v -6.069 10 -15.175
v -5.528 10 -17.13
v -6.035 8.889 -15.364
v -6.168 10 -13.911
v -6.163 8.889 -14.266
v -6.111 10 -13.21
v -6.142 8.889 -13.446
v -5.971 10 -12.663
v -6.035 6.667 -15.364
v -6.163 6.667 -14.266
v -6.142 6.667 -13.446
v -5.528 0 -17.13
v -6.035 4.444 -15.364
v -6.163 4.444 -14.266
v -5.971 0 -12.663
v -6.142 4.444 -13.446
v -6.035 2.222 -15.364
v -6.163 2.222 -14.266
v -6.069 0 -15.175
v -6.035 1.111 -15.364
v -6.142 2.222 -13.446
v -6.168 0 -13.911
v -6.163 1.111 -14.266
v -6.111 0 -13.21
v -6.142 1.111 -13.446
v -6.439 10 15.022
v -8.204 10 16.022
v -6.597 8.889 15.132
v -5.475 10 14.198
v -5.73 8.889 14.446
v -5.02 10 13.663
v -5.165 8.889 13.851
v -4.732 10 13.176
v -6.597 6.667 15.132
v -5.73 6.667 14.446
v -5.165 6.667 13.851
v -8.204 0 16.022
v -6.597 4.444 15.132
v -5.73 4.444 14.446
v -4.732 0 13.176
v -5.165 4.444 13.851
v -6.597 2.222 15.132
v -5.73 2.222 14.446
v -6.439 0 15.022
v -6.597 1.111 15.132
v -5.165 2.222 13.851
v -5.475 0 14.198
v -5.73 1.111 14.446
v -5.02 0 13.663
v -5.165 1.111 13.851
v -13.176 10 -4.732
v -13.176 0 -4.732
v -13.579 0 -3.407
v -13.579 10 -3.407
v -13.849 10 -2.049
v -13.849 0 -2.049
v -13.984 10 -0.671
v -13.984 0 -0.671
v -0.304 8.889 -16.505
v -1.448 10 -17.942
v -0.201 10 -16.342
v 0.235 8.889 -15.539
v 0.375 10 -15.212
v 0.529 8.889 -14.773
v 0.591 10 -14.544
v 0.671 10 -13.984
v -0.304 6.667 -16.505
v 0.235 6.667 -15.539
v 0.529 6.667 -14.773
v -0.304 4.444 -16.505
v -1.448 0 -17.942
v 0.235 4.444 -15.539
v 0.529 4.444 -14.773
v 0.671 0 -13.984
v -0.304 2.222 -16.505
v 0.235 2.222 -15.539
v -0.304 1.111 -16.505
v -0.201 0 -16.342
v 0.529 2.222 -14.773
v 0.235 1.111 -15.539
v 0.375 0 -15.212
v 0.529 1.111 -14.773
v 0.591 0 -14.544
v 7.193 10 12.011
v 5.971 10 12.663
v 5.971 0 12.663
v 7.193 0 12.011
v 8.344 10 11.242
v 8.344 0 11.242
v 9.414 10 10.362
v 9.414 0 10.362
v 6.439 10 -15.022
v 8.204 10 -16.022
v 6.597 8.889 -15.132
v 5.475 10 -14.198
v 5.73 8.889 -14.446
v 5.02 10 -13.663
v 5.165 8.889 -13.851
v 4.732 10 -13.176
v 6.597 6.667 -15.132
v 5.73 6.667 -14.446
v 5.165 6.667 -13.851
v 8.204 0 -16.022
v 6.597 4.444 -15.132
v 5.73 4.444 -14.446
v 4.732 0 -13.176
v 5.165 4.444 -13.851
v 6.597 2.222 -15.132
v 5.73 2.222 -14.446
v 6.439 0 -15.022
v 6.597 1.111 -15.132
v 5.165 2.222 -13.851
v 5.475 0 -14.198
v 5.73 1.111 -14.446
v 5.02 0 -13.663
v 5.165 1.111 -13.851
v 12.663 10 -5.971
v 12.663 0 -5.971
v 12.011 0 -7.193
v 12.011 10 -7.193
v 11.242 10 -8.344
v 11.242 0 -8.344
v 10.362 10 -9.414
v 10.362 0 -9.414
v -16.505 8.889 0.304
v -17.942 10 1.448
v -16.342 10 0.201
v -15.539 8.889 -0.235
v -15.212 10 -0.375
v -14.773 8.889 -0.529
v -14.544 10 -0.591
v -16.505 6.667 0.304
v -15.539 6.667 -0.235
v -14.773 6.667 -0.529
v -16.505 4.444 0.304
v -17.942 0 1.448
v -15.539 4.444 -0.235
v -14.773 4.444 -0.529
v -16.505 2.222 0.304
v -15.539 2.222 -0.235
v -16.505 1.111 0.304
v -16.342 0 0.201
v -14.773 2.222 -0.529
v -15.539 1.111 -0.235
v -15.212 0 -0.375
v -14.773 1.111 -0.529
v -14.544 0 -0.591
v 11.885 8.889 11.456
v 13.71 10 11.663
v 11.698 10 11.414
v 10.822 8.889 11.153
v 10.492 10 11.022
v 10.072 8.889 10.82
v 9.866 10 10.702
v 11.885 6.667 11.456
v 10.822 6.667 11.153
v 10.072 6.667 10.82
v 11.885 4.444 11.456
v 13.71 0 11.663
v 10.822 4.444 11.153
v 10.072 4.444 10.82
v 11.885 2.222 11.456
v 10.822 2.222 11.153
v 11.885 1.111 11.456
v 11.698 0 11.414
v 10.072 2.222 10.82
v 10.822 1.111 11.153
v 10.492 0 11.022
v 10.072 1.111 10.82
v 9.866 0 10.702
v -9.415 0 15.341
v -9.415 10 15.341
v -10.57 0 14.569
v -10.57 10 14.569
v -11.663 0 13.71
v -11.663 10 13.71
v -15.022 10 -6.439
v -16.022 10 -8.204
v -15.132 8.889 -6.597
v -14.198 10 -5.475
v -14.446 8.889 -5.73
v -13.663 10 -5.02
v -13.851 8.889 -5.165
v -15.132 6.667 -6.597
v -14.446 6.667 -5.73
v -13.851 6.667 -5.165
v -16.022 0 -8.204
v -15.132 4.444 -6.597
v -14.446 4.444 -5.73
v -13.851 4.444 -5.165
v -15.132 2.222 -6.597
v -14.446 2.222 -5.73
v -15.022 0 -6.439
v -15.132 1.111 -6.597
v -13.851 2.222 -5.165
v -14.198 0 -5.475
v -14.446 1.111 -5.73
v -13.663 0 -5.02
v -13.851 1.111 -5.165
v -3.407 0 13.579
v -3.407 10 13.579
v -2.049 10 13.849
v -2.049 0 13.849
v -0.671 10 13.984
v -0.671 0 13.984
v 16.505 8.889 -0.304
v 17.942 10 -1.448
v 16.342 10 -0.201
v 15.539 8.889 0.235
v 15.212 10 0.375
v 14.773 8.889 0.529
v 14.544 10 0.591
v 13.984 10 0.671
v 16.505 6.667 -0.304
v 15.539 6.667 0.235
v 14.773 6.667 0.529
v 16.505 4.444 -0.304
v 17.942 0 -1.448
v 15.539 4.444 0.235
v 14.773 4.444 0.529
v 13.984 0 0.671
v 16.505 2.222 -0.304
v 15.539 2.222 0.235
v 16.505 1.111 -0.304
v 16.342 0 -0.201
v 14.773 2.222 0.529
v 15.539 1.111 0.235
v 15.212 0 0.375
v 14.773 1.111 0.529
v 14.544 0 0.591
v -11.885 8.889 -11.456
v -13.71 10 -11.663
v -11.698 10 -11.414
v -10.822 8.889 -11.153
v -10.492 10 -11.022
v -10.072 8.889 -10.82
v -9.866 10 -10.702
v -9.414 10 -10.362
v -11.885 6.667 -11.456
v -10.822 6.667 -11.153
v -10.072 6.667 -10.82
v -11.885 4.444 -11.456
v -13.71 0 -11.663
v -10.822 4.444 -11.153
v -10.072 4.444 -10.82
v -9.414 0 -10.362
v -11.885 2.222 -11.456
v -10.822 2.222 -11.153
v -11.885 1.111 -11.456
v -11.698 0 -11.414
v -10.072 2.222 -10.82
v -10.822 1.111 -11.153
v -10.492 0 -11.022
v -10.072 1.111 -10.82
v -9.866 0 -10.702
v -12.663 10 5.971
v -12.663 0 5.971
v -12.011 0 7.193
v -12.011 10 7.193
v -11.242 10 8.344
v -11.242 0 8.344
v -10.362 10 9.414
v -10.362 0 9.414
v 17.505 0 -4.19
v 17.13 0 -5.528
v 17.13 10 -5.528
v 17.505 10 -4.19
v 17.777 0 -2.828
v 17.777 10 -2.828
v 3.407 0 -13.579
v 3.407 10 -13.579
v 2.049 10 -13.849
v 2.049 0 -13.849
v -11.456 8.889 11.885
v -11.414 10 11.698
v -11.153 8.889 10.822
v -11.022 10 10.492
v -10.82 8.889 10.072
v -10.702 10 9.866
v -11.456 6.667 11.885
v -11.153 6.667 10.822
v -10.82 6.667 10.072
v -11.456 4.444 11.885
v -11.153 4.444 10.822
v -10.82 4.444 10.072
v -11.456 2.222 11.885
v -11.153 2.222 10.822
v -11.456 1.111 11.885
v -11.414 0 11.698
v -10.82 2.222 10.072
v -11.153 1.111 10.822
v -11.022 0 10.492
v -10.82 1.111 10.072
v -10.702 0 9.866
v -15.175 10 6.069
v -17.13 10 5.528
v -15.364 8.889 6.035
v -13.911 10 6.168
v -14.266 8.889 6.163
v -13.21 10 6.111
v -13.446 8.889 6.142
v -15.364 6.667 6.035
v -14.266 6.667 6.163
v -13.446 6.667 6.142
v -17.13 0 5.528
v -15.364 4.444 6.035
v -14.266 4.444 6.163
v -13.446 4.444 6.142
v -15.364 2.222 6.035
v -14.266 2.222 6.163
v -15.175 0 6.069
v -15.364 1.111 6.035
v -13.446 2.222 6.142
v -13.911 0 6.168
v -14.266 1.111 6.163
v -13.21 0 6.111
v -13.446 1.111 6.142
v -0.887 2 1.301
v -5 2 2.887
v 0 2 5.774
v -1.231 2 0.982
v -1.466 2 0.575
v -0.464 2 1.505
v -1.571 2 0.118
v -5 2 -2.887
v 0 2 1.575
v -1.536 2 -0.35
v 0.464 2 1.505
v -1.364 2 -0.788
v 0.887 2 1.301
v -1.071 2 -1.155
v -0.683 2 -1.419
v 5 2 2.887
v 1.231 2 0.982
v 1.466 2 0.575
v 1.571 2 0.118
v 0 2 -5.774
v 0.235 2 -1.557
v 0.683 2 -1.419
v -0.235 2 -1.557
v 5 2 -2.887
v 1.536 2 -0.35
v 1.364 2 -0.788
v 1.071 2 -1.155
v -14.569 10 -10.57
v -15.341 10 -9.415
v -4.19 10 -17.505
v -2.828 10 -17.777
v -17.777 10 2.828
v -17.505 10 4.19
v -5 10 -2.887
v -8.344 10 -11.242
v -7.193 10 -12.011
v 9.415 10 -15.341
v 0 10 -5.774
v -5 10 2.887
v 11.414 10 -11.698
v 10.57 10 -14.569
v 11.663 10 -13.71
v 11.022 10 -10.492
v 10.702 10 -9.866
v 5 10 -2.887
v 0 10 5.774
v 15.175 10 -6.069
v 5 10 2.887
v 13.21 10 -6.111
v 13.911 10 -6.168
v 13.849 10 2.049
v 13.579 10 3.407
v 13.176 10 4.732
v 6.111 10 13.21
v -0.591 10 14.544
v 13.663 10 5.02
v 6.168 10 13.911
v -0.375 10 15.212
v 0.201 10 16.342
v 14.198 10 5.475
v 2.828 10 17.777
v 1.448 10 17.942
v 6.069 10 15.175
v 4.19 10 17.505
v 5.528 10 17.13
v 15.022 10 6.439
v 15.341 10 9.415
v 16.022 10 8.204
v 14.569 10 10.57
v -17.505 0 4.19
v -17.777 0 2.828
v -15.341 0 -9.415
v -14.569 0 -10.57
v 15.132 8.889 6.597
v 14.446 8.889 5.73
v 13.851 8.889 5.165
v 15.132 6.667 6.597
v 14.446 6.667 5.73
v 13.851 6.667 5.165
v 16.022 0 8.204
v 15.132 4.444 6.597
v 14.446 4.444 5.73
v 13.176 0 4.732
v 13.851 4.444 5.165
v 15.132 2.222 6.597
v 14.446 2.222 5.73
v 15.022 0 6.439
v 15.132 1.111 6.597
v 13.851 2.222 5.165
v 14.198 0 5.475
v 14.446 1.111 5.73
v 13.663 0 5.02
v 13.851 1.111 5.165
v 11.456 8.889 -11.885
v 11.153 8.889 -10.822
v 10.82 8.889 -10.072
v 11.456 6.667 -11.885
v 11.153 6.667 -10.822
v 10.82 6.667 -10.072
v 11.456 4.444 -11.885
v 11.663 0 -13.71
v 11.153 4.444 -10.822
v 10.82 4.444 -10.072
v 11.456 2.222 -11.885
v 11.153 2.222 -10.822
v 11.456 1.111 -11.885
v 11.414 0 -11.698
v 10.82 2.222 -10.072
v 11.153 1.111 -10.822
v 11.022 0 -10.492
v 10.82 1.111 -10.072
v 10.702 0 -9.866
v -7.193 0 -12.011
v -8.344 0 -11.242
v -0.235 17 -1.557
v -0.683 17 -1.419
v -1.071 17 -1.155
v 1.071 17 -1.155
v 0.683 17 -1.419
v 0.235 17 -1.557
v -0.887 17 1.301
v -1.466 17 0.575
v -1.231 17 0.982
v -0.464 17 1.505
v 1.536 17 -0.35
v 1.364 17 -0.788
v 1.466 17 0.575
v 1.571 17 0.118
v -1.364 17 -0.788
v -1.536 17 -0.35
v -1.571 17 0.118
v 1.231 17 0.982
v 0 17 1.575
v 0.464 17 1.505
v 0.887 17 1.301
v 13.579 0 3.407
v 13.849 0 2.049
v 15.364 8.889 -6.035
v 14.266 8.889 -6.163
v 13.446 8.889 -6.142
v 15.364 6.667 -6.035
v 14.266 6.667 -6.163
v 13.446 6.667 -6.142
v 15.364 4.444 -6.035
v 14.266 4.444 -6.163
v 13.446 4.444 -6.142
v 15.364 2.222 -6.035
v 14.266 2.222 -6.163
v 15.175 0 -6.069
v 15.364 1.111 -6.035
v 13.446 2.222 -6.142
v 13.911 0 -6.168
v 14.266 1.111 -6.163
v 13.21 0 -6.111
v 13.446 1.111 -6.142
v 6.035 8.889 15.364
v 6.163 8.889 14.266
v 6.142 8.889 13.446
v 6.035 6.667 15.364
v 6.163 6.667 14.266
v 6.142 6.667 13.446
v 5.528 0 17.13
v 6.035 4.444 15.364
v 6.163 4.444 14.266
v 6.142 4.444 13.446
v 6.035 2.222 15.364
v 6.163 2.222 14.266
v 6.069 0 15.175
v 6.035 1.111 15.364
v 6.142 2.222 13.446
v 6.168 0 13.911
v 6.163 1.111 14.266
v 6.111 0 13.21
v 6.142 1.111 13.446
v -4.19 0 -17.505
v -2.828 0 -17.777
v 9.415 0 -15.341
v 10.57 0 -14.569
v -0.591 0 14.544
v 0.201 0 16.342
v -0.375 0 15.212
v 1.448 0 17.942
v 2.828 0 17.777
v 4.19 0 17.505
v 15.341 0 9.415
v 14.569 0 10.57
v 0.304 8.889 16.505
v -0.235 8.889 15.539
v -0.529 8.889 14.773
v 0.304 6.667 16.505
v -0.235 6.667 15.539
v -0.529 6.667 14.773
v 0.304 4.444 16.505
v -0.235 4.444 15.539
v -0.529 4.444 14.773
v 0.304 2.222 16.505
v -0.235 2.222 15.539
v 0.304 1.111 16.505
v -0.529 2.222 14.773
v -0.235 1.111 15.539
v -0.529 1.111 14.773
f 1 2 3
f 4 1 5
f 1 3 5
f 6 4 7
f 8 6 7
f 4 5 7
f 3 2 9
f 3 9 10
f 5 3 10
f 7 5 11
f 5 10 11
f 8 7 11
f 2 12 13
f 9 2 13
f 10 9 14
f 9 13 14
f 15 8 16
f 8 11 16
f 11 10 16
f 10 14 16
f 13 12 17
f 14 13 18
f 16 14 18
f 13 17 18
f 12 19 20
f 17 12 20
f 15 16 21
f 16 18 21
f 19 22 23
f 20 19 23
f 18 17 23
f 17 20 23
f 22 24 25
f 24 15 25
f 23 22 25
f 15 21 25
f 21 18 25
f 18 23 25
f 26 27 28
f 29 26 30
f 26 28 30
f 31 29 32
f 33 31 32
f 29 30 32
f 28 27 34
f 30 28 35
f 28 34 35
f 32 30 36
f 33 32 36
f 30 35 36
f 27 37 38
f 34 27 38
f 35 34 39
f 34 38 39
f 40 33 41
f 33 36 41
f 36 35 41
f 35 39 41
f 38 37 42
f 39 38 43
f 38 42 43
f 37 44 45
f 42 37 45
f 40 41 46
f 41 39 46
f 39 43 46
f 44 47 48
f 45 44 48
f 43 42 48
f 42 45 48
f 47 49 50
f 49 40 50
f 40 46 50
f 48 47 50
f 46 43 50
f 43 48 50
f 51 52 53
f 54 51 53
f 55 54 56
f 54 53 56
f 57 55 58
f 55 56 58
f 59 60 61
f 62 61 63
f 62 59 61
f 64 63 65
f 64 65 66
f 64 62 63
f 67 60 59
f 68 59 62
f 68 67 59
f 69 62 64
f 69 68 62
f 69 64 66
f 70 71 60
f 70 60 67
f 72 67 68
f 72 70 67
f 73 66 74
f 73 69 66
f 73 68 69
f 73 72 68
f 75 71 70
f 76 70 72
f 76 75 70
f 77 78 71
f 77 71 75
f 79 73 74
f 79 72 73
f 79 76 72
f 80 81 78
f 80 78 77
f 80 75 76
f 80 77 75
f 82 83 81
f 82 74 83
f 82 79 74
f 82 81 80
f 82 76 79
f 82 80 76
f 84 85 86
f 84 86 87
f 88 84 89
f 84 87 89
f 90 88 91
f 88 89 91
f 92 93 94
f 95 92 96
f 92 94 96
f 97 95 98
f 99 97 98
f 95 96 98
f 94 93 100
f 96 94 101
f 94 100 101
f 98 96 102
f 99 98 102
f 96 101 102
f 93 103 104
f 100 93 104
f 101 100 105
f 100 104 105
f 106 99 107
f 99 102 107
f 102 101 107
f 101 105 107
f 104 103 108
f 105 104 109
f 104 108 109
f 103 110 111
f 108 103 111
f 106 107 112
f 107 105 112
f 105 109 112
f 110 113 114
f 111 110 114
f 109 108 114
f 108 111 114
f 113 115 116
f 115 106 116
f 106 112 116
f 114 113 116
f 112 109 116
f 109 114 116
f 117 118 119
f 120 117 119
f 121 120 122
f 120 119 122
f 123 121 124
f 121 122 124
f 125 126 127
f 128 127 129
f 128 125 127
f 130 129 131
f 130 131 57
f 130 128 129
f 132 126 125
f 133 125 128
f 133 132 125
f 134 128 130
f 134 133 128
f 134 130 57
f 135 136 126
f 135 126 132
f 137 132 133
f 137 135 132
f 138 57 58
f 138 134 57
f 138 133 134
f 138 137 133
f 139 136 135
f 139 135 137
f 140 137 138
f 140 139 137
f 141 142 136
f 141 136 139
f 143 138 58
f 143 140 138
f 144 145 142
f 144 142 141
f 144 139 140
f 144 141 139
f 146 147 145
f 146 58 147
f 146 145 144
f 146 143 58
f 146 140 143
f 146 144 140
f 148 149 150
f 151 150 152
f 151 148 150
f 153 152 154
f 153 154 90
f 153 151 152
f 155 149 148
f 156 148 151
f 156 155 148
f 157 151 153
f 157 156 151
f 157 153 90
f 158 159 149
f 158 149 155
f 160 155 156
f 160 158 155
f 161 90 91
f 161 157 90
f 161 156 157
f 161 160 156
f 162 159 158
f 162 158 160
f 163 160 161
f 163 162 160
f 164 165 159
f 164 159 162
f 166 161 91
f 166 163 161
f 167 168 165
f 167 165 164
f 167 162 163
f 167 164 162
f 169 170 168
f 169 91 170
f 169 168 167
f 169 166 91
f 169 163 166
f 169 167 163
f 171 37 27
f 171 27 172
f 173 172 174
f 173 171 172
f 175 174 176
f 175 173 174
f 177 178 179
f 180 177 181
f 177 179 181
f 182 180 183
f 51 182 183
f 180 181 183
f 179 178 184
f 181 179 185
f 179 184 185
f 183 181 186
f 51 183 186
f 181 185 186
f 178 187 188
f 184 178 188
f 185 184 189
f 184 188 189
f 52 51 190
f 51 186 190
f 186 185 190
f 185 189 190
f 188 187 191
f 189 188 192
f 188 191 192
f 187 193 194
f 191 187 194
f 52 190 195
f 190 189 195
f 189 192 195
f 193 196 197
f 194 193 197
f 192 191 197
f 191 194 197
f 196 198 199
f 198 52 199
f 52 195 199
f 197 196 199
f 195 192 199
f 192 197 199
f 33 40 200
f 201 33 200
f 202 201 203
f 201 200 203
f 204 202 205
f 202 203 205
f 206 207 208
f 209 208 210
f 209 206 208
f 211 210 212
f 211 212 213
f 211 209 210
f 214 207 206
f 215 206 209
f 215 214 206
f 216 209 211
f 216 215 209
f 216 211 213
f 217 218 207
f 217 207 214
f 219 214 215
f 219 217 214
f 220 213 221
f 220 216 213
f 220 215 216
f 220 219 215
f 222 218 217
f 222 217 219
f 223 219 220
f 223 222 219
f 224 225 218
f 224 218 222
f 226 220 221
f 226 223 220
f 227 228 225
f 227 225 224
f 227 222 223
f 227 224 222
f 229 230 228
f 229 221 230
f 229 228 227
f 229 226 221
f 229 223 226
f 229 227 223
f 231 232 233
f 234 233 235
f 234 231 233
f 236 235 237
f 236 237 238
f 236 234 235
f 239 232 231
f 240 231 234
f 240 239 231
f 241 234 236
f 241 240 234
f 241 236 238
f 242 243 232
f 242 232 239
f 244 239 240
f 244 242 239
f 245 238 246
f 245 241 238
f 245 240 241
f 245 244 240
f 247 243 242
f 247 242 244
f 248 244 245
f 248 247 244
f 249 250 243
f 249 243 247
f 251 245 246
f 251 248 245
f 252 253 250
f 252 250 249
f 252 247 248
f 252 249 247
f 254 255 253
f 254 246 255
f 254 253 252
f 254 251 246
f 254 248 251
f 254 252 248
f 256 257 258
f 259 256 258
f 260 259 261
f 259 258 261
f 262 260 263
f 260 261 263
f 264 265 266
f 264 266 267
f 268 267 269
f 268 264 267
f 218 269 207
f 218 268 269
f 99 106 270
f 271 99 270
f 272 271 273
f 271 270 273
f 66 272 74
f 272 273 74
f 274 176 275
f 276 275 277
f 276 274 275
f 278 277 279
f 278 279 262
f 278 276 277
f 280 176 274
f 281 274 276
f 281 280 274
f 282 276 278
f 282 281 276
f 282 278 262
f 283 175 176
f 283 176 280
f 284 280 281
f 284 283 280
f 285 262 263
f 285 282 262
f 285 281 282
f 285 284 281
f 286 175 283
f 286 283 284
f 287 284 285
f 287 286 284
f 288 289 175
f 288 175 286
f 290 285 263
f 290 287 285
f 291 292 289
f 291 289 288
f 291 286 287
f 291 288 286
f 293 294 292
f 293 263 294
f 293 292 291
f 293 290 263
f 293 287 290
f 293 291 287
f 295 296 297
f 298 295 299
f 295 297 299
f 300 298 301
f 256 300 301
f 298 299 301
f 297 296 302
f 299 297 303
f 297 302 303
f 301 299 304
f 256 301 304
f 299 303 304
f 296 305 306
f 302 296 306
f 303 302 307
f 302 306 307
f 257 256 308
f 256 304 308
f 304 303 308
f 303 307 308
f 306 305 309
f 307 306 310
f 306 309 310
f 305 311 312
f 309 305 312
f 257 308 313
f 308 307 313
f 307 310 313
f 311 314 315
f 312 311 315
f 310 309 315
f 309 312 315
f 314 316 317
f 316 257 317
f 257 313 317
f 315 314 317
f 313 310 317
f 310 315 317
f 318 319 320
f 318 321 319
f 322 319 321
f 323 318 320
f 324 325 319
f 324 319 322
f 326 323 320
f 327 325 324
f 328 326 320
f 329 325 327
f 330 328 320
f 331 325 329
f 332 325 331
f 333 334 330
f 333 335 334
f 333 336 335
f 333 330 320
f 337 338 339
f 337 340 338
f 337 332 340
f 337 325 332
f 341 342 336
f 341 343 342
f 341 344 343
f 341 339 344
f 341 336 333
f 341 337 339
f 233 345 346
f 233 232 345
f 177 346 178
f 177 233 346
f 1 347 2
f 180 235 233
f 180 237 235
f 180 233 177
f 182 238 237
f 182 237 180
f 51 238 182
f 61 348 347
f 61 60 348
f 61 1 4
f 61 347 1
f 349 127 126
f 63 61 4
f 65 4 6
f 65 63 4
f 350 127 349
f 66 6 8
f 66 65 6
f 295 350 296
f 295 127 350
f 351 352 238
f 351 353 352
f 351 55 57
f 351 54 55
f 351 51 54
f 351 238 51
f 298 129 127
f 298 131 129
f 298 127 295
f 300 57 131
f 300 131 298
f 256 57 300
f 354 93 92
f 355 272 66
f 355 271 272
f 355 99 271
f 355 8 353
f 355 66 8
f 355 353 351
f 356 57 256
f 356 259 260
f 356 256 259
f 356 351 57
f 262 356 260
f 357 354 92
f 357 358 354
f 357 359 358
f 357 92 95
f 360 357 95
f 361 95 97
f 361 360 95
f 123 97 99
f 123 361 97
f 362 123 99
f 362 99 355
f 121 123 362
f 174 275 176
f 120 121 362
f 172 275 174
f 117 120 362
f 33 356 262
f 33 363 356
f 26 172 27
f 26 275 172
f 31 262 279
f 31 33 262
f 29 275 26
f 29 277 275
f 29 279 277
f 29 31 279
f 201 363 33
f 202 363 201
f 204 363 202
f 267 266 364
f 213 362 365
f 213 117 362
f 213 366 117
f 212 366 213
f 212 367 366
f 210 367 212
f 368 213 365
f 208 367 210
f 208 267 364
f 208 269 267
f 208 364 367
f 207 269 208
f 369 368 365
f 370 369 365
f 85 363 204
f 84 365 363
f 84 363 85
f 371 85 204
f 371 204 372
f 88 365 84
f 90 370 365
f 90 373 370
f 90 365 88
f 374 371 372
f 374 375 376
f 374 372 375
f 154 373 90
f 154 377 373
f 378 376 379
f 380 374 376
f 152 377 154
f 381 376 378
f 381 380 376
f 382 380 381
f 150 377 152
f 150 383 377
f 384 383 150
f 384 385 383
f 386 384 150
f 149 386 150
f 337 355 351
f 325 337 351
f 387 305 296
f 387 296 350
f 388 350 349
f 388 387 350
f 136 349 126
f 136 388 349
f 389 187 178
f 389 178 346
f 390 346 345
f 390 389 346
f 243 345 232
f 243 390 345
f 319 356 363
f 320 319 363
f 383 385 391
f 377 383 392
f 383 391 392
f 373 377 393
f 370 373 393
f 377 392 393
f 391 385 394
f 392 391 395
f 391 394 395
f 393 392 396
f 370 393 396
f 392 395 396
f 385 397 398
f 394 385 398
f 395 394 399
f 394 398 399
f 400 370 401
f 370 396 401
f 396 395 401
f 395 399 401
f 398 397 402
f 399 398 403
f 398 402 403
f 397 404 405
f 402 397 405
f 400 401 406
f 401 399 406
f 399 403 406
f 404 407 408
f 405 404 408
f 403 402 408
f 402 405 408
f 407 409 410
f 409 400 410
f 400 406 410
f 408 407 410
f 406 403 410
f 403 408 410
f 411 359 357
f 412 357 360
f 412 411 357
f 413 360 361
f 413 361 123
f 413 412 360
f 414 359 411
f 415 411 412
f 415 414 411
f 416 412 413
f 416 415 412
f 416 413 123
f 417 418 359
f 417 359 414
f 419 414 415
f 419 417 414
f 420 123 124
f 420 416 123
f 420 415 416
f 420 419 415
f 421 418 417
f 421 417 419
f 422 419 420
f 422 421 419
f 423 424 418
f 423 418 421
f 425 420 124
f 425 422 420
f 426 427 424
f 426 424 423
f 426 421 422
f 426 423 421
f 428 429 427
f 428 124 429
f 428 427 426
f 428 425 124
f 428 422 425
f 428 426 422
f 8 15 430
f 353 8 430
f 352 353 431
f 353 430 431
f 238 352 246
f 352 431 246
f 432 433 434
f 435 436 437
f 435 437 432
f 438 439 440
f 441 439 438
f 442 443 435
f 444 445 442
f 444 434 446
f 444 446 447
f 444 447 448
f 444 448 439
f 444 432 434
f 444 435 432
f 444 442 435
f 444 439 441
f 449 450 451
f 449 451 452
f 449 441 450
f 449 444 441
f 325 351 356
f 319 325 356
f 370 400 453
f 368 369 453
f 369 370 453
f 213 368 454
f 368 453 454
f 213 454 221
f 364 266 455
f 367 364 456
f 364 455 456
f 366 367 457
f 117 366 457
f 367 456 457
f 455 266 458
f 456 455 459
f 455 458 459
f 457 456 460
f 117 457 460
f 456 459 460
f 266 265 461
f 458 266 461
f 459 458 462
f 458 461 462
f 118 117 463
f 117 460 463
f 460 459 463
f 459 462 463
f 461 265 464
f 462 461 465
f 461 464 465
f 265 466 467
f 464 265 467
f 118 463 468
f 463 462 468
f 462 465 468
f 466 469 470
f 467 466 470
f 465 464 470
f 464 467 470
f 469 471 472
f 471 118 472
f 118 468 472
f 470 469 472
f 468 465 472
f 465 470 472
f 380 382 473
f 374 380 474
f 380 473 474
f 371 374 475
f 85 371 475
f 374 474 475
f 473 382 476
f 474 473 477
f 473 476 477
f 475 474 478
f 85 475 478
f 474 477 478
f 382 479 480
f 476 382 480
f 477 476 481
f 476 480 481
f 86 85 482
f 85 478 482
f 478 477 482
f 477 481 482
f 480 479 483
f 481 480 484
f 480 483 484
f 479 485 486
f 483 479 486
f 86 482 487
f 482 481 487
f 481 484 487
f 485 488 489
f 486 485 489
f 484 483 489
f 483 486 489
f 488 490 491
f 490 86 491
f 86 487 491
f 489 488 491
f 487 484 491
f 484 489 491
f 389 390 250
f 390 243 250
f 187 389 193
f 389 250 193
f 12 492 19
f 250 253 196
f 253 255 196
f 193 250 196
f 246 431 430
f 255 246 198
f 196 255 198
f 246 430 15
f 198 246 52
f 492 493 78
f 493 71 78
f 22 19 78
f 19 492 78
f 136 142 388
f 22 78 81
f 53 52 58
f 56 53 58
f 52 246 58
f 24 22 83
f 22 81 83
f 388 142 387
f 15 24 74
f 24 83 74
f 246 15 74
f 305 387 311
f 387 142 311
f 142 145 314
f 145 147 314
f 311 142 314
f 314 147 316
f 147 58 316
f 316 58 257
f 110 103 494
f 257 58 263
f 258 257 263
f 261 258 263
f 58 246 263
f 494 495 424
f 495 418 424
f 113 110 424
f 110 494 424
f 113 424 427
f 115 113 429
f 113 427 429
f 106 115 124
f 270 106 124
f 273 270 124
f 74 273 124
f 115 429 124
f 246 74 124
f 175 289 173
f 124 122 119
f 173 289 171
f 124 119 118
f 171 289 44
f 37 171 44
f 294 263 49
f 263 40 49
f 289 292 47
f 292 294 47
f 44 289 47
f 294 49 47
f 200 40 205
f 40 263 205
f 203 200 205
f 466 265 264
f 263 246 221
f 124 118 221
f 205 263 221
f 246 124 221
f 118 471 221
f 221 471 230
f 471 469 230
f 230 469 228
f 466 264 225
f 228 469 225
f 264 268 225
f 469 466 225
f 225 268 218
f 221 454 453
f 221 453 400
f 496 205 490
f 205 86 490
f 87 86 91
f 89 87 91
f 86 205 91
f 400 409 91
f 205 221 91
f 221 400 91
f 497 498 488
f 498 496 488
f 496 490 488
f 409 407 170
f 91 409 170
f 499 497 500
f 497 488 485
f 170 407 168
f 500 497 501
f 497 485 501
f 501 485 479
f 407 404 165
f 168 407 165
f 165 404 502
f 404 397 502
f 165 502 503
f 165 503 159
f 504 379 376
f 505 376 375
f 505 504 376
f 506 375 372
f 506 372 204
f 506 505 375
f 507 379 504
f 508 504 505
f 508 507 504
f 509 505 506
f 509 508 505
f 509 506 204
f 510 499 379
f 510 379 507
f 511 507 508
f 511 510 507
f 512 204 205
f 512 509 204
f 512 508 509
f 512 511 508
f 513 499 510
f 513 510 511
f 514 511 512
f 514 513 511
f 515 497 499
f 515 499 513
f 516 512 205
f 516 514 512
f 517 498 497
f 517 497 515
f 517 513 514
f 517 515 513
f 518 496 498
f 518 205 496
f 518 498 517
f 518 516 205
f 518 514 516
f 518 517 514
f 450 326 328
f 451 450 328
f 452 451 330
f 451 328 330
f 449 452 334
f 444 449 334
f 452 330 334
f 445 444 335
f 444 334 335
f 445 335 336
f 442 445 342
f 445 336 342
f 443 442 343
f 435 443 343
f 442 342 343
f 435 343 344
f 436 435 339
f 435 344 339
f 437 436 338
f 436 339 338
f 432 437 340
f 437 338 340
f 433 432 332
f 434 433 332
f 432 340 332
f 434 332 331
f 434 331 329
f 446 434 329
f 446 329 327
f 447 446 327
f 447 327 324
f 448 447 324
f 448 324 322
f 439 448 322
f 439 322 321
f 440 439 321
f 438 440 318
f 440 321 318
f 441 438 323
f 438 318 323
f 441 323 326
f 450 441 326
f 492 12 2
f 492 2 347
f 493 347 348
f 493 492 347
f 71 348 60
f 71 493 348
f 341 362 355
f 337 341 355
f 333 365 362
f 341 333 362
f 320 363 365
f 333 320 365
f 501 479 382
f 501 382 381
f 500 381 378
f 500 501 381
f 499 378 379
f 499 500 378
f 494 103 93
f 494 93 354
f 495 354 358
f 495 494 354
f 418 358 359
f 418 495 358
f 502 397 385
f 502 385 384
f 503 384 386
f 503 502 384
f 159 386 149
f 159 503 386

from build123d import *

# Parameters (mm, degrees)
SKETCH_1_R               = 14
EXTRUDE_1_DEPTH          = 10
EXTRUDE_2_DEPTH          = 10
PATTERN_CIRCULAR_1_COUNT = 8
CUT_EXTRUDE_2_DEPTH      = 8
SKETCH_8_R               = 1.575
EXTRUDE_5_DEPTH          = 15


with BuildPart() as part:
    # ｽｹｯﾁ1 → ﾎﾞｽ - 押し出し1 (new body)
    with BuildSketch(Plane(origin=(0, 0, 0), x_dir=(1, 0, 0), z_dir=(0, 1, 0))):
        with Locations(Location((0, 0, 0), (0, 0, 270))):
            Circle(SKETCH_1_R)
    extrude(amount=EXTRUDE_1_DEPTH)

    # ｽｹｯﾁ3 → ﾎﾞｽ - 押し出し2 (add)
    with BuildSketch(Plane(origin=(0, 0, 0), x_dir=(1, 0, 0), z_dir=(0, 1, 0))):
        with BuildLine():
            ThreePointArc((0.670662773, 13.983926896), (-2.731264508, 13.730993926), (-5.971028752, 12.662812312))
            add(Edge.make_bspline(
                [(-5.528304984, 17.130027554), (-5.669447216, 16.763315044), (-5.860218101, 16.179410176), (-6.038366418, 15.38918786), (-6.12675066, 14.806480124), (-6.167823232, 14.2902167), (-6.171562682, 13.84380553), (-6.148097009, 13.46960438), (-6.10787192, 13.168784501), (-6.053435711, 12.906118131), (-6.005913858, 12.745636704), (-5.971028752, 12.662812312)],
                knots=[0, 0, 0, 0, 0.257950131, 0.40241706, 0.531259136, 0.64447636, 0.742068735, 0.824036262, 0.890378946, 0.941096793, 1, 1, 1, 1], degree=3))
            ThreePointArc((-5.528304984, 17.130027554), (-3.511625796, 17.654135047), (-1.447889917, 17.941672575))
            add(Edge.make_bspline(
                [(-1.447889917, 17.941672575), (-1.177156696, 17.656887186), (-0.77745666, 17.190434286), (-0.310464088, 16.528538472), (-0.0058151, 16.024009907), (0.229696468, 15.562762489), (0.403985429, 15.151763371), (0.525506554, 14.797066663), (0.603462201, 14.50375186), (0.65368777, 14.240247941), (0.671196886, 14.073796609), (0.670662773, 13.983926896)],
                knots=[0, 0, 0, 0, 0.257950131, 0.40241706, 0.531259136, 0.64447636, 0.742068735, 0.824036262, 0.890378946, 0.941096793, 1, 1, 1, 1], degree=3))
        make_face()
    extrude_2 = extrude(amount=EXTRUDE_2_DEPTH)

    # 円形ﾊﾟﾀｰﾝ1: ﾎﾞｽ - 押し出し2 ×8 about axis
    pattern_circular_1_axis = Axis((0, 10, 0), (0, 1, 0))
    for i in range(1, PATTERN_CIRCULAR_1_COUNT):
        add(extrude_2.rotate(pattern_circular_1_axis, i * 360 / PATTERN_CIRCULAR_1_COUNT))

    # ｽｹｯﾁ6 → ｶｯﾄ - 押し出し2 (cut)
    with BuildSketch(Plane(origin=(0, 10, 0), x_dir=(1, 0, 0), z_dir=(0, 1, 0))):
        Polygon((0, 5.773502692), (-5, 2.886751346), (-5, -2.886751346), (0, -5.773502692), (5, -2.886751346), (5, 2.886751346), align=None)
    extrude(amount=-CUT_EXTRUDE_2_DEPTH, mode=Mode.SUBTRACT)

    # ｽｹｯﾁ8 → ﾎﾞｽ - 押し出し5 (add)
    with BuildSketch(Plane(origin=(0, 2, 0), x_dir=(1, 0, 0), z_dir=(0, 1, 0))):
        with Locations(Location((0, 0, 0), (0, 0, 270))):
            Circle(SKETCH_8_R)
    extrude(amount=EXTRUDE_5_DEPTH)


solid = part.part
